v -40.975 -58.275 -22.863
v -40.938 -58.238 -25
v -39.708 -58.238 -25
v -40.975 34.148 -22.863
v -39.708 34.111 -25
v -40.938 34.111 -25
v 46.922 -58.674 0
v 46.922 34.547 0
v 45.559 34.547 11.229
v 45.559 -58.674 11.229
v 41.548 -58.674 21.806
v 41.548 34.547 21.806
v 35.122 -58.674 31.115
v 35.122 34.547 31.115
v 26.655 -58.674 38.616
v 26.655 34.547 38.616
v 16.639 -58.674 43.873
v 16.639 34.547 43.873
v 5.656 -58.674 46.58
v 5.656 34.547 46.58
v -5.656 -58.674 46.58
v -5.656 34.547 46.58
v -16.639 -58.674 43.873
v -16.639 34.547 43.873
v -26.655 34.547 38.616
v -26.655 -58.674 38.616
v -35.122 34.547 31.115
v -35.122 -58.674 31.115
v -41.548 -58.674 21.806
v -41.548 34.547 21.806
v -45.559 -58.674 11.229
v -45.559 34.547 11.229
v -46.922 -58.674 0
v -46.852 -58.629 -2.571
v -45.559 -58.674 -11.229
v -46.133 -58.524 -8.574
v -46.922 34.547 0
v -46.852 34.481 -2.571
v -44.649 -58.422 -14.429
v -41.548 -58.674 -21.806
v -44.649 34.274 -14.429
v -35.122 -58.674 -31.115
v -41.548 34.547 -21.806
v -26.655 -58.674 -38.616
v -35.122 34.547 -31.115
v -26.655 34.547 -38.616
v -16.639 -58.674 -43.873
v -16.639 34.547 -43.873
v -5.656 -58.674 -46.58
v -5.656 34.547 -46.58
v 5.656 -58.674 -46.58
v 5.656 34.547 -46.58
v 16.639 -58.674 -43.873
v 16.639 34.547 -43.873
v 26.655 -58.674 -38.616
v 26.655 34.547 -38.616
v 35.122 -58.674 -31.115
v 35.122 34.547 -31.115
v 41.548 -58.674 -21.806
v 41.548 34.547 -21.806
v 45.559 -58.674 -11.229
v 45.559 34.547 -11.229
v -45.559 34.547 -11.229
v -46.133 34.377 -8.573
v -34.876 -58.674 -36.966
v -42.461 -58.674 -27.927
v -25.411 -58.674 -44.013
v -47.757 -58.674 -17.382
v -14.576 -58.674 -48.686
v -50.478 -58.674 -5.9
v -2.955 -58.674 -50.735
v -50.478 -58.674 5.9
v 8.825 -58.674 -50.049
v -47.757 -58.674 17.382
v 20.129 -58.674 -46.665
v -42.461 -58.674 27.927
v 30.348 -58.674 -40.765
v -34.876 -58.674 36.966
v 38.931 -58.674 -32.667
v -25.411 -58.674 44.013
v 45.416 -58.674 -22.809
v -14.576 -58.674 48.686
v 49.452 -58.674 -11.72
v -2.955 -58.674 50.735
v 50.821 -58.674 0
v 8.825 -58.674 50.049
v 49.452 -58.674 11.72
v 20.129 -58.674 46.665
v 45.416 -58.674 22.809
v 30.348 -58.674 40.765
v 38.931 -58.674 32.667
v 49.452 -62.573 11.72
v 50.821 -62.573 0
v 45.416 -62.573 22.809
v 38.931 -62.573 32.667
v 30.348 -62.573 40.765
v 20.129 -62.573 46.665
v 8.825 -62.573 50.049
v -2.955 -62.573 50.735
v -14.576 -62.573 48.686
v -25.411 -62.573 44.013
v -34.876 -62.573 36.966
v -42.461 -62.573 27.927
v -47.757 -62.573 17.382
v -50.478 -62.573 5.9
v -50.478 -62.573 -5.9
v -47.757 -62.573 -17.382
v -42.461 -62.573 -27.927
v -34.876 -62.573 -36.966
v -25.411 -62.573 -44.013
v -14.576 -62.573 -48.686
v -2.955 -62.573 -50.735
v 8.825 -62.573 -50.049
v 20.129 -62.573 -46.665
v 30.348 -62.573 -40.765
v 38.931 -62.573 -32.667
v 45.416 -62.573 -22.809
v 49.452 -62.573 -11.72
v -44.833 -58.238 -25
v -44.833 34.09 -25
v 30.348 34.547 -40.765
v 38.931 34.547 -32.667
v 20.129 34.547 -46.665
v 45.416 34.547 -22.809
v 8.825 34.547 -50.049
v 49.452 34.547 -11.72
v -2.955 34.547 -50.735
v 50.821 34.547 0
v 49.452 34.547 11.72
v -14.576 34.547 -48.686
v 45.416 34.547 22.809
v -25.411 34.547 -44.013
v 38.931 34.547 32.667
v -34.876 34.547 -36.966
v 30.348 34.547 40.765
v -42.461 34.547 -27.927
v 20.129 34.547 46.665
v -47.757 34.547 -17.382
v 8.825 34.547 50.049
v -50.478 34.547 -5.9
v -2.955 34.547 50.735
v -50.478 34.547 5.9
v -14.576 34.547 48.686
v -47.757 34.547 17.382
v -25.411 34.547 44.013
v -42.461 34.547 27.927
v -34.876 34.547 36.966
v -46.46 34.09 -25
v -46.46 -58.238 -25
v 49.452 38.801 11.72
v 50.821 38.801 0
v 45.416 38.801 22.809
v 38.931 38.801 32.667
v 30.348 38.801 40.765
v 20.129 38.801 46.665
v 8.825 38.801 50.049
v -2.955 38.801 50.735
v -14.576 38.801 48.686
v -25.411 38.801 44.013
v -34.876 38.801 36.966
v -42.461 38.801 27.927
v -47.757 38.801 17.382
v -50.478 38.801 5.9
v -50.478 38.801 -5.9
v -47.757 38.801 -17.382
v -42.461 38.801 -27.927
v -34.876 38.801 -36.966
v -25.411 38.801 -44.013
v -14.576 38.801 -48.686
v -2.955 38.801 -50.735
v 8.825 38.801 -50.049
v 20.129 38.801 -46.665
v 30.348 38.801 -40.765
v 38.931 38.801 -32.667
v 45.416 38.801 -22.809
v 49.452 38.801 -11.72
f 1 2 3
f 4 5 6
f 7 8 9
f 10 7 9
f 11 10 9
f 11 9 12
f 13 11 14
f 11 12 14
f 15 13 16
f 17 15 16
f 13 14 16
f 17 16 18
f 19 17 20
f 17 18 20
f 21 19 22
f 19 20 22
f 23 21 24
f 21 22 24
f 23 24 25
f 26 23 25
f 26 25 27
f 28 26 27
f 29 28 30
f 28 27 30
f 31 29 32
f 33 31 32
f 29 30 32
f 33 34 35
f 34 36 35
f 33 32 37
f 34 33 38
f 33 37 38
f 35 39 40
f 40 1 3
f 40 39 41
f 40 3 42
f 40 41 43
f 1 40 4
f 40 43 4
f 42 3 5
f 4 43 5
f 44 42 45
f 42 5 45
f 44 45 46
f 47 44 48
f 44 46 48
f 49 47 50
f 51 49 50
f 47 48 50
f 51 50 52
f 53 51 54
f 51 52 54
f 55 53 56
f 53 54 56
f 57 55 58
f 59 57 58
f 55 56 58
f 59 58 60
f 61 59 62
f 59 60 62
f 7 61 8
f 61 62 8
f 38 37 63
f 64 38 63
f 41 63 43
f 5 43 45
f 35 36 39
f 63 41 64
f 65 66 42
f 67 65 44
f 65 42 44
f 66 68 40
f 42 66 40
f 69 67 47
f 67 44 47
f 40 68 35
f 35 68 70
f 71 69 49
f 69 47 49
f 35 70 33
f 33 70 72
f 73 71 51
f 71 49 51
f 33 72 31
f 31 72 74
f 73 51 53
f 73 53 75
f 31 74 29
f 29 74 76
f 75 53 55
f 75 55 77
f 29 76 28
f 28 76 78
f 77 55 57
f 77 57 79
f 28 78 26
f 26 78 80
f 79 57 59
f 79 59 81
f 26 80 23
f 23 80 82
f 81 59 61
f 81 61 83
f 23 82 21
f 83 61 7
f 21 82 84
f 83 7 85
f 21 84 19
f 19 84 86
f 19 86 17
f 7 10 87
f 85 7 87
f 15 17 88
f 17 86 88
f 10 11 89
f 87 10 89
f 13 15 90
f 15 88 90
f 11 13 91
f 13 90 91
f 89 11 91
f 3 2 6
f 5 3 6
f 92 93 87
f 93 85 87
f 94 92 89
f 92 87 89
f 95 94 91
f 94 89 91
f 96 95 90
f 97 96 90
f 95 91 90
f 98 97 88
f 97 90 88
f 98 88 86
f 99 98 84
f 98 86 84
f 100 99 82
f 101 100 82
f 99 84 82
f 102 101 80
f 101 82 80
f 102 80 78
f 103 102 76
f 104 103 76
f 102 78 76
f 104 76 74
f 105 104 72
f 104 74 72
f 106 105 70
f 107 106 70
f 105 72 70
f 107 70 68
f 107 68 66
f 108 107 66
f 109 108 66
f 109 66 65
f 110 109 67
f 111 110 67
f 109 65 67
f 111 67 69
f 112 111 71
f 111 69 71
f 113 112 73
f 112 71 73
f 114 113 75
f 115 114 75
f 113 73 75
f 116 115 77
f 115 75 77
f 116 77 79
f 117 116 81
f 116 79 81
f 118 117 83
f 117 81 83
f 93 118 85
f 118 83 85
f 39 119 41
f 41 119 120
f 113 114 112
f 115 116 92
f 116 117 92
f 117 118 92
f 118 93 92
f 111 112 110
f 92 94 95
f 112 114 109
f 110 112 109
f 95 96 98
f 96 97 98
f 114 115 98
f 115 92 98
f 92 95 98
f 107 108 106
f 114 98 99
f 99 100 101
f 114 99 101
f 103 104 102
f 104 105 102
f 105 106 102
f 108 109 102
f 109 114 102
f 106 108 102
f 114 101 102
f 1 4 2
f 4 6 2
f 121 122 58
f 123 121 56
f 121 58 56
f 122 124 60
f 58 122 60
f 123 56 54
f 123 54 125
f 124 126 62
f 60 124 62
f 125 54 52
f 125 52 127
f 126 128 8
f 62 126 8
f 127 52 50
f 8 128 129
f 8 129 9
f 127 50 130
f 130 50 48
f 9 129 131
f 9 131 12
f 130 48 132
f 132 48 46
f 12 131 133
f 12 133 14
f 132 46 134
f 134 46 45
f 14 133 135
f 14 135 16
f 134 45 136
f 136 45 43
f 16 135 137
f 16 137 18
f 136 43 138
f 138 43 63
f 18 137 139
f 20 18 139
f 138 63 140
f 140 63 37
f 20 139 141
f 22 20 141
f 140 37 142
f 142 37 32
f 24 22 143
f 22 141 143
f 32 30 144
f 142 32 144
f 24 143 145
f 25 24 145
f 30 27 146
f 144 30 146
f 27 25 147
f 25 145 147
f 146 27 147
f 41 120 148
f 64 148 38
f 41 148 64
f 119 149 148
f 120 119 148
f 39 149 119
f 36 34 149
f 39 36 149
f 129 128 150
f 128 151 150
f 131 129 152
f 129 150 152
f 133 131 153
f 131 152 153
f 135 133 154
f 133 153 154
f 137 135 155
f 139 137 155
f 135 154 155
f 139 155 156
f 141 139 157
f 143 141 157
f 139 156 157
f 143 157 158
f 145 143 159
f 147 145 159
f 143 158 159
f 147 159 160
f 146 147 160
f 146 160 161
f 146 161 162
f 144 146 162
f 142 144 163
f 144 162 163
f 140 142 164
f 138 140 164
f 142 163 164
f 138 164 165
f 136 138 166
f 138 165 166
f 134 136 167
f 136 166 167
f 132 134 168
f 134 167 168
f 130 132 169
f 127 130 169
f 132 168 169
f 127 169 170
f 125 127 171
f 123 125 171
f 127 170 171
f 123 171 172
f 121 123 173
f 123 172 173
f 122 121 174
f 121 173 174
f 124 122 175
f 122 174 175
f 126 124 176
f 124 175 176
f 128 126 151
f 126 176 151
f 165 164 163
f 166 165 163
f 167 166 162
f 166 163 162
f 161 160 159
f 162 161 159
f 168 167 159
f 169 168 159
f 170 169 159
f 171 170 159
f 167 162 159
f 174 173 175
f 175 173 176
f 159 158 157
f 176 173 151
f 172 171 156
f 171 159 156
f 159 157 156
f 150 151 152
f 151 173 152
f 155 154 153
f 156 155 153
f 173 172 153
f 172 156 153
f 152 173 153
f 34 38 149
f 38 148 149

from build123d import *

# Parameters (mm, degrees)
CROQUIS3_W              = 2.5
CROQUIS3_H              = 93.200468797
CROQUIS3_H_2            = 93.221326365
SALIENTE_EXTRUIR1_DEPTH = 25
SALIENTE_EXTRUIR1_TAPER = 1


with BuildPart() as part:
    # Croquis1 → Revolución1 (revolve)
    with BuildSketch(Plane.XY):
        Polygon((0, 38.800633525), (0, -62.573128225), (50.821461866, -62.573128225), (50.821461866, -58.674137389), (46.92247103, -58.674137389), (46.92247103, 34.547188976), (50.821461866, 34.547188976), (50.821461866, 38.800633525), align=None)
    revolve(axis=Axis((0, 38.800633525, 0), (0, -1, 0)))

    # Croquis3 → Saliente-Extruir1 (add)
    with BuildSketch(Plane.XY):
        with Locations((-45.646866178, -12.07390299)):
            Rectangle(CROQUIS3_W, CROQUIS3_H)
        with Locations((-40.124494984, -12.063474207)):
            Rectangle(CROQUIS3_W, CROQUIS3_H_2)
    extrude(amount=-SALIENTE_EXTRUIR1_DEPTH, taper=SALIENTE_EXTRUIR1_TAPER)


solid = part.part
